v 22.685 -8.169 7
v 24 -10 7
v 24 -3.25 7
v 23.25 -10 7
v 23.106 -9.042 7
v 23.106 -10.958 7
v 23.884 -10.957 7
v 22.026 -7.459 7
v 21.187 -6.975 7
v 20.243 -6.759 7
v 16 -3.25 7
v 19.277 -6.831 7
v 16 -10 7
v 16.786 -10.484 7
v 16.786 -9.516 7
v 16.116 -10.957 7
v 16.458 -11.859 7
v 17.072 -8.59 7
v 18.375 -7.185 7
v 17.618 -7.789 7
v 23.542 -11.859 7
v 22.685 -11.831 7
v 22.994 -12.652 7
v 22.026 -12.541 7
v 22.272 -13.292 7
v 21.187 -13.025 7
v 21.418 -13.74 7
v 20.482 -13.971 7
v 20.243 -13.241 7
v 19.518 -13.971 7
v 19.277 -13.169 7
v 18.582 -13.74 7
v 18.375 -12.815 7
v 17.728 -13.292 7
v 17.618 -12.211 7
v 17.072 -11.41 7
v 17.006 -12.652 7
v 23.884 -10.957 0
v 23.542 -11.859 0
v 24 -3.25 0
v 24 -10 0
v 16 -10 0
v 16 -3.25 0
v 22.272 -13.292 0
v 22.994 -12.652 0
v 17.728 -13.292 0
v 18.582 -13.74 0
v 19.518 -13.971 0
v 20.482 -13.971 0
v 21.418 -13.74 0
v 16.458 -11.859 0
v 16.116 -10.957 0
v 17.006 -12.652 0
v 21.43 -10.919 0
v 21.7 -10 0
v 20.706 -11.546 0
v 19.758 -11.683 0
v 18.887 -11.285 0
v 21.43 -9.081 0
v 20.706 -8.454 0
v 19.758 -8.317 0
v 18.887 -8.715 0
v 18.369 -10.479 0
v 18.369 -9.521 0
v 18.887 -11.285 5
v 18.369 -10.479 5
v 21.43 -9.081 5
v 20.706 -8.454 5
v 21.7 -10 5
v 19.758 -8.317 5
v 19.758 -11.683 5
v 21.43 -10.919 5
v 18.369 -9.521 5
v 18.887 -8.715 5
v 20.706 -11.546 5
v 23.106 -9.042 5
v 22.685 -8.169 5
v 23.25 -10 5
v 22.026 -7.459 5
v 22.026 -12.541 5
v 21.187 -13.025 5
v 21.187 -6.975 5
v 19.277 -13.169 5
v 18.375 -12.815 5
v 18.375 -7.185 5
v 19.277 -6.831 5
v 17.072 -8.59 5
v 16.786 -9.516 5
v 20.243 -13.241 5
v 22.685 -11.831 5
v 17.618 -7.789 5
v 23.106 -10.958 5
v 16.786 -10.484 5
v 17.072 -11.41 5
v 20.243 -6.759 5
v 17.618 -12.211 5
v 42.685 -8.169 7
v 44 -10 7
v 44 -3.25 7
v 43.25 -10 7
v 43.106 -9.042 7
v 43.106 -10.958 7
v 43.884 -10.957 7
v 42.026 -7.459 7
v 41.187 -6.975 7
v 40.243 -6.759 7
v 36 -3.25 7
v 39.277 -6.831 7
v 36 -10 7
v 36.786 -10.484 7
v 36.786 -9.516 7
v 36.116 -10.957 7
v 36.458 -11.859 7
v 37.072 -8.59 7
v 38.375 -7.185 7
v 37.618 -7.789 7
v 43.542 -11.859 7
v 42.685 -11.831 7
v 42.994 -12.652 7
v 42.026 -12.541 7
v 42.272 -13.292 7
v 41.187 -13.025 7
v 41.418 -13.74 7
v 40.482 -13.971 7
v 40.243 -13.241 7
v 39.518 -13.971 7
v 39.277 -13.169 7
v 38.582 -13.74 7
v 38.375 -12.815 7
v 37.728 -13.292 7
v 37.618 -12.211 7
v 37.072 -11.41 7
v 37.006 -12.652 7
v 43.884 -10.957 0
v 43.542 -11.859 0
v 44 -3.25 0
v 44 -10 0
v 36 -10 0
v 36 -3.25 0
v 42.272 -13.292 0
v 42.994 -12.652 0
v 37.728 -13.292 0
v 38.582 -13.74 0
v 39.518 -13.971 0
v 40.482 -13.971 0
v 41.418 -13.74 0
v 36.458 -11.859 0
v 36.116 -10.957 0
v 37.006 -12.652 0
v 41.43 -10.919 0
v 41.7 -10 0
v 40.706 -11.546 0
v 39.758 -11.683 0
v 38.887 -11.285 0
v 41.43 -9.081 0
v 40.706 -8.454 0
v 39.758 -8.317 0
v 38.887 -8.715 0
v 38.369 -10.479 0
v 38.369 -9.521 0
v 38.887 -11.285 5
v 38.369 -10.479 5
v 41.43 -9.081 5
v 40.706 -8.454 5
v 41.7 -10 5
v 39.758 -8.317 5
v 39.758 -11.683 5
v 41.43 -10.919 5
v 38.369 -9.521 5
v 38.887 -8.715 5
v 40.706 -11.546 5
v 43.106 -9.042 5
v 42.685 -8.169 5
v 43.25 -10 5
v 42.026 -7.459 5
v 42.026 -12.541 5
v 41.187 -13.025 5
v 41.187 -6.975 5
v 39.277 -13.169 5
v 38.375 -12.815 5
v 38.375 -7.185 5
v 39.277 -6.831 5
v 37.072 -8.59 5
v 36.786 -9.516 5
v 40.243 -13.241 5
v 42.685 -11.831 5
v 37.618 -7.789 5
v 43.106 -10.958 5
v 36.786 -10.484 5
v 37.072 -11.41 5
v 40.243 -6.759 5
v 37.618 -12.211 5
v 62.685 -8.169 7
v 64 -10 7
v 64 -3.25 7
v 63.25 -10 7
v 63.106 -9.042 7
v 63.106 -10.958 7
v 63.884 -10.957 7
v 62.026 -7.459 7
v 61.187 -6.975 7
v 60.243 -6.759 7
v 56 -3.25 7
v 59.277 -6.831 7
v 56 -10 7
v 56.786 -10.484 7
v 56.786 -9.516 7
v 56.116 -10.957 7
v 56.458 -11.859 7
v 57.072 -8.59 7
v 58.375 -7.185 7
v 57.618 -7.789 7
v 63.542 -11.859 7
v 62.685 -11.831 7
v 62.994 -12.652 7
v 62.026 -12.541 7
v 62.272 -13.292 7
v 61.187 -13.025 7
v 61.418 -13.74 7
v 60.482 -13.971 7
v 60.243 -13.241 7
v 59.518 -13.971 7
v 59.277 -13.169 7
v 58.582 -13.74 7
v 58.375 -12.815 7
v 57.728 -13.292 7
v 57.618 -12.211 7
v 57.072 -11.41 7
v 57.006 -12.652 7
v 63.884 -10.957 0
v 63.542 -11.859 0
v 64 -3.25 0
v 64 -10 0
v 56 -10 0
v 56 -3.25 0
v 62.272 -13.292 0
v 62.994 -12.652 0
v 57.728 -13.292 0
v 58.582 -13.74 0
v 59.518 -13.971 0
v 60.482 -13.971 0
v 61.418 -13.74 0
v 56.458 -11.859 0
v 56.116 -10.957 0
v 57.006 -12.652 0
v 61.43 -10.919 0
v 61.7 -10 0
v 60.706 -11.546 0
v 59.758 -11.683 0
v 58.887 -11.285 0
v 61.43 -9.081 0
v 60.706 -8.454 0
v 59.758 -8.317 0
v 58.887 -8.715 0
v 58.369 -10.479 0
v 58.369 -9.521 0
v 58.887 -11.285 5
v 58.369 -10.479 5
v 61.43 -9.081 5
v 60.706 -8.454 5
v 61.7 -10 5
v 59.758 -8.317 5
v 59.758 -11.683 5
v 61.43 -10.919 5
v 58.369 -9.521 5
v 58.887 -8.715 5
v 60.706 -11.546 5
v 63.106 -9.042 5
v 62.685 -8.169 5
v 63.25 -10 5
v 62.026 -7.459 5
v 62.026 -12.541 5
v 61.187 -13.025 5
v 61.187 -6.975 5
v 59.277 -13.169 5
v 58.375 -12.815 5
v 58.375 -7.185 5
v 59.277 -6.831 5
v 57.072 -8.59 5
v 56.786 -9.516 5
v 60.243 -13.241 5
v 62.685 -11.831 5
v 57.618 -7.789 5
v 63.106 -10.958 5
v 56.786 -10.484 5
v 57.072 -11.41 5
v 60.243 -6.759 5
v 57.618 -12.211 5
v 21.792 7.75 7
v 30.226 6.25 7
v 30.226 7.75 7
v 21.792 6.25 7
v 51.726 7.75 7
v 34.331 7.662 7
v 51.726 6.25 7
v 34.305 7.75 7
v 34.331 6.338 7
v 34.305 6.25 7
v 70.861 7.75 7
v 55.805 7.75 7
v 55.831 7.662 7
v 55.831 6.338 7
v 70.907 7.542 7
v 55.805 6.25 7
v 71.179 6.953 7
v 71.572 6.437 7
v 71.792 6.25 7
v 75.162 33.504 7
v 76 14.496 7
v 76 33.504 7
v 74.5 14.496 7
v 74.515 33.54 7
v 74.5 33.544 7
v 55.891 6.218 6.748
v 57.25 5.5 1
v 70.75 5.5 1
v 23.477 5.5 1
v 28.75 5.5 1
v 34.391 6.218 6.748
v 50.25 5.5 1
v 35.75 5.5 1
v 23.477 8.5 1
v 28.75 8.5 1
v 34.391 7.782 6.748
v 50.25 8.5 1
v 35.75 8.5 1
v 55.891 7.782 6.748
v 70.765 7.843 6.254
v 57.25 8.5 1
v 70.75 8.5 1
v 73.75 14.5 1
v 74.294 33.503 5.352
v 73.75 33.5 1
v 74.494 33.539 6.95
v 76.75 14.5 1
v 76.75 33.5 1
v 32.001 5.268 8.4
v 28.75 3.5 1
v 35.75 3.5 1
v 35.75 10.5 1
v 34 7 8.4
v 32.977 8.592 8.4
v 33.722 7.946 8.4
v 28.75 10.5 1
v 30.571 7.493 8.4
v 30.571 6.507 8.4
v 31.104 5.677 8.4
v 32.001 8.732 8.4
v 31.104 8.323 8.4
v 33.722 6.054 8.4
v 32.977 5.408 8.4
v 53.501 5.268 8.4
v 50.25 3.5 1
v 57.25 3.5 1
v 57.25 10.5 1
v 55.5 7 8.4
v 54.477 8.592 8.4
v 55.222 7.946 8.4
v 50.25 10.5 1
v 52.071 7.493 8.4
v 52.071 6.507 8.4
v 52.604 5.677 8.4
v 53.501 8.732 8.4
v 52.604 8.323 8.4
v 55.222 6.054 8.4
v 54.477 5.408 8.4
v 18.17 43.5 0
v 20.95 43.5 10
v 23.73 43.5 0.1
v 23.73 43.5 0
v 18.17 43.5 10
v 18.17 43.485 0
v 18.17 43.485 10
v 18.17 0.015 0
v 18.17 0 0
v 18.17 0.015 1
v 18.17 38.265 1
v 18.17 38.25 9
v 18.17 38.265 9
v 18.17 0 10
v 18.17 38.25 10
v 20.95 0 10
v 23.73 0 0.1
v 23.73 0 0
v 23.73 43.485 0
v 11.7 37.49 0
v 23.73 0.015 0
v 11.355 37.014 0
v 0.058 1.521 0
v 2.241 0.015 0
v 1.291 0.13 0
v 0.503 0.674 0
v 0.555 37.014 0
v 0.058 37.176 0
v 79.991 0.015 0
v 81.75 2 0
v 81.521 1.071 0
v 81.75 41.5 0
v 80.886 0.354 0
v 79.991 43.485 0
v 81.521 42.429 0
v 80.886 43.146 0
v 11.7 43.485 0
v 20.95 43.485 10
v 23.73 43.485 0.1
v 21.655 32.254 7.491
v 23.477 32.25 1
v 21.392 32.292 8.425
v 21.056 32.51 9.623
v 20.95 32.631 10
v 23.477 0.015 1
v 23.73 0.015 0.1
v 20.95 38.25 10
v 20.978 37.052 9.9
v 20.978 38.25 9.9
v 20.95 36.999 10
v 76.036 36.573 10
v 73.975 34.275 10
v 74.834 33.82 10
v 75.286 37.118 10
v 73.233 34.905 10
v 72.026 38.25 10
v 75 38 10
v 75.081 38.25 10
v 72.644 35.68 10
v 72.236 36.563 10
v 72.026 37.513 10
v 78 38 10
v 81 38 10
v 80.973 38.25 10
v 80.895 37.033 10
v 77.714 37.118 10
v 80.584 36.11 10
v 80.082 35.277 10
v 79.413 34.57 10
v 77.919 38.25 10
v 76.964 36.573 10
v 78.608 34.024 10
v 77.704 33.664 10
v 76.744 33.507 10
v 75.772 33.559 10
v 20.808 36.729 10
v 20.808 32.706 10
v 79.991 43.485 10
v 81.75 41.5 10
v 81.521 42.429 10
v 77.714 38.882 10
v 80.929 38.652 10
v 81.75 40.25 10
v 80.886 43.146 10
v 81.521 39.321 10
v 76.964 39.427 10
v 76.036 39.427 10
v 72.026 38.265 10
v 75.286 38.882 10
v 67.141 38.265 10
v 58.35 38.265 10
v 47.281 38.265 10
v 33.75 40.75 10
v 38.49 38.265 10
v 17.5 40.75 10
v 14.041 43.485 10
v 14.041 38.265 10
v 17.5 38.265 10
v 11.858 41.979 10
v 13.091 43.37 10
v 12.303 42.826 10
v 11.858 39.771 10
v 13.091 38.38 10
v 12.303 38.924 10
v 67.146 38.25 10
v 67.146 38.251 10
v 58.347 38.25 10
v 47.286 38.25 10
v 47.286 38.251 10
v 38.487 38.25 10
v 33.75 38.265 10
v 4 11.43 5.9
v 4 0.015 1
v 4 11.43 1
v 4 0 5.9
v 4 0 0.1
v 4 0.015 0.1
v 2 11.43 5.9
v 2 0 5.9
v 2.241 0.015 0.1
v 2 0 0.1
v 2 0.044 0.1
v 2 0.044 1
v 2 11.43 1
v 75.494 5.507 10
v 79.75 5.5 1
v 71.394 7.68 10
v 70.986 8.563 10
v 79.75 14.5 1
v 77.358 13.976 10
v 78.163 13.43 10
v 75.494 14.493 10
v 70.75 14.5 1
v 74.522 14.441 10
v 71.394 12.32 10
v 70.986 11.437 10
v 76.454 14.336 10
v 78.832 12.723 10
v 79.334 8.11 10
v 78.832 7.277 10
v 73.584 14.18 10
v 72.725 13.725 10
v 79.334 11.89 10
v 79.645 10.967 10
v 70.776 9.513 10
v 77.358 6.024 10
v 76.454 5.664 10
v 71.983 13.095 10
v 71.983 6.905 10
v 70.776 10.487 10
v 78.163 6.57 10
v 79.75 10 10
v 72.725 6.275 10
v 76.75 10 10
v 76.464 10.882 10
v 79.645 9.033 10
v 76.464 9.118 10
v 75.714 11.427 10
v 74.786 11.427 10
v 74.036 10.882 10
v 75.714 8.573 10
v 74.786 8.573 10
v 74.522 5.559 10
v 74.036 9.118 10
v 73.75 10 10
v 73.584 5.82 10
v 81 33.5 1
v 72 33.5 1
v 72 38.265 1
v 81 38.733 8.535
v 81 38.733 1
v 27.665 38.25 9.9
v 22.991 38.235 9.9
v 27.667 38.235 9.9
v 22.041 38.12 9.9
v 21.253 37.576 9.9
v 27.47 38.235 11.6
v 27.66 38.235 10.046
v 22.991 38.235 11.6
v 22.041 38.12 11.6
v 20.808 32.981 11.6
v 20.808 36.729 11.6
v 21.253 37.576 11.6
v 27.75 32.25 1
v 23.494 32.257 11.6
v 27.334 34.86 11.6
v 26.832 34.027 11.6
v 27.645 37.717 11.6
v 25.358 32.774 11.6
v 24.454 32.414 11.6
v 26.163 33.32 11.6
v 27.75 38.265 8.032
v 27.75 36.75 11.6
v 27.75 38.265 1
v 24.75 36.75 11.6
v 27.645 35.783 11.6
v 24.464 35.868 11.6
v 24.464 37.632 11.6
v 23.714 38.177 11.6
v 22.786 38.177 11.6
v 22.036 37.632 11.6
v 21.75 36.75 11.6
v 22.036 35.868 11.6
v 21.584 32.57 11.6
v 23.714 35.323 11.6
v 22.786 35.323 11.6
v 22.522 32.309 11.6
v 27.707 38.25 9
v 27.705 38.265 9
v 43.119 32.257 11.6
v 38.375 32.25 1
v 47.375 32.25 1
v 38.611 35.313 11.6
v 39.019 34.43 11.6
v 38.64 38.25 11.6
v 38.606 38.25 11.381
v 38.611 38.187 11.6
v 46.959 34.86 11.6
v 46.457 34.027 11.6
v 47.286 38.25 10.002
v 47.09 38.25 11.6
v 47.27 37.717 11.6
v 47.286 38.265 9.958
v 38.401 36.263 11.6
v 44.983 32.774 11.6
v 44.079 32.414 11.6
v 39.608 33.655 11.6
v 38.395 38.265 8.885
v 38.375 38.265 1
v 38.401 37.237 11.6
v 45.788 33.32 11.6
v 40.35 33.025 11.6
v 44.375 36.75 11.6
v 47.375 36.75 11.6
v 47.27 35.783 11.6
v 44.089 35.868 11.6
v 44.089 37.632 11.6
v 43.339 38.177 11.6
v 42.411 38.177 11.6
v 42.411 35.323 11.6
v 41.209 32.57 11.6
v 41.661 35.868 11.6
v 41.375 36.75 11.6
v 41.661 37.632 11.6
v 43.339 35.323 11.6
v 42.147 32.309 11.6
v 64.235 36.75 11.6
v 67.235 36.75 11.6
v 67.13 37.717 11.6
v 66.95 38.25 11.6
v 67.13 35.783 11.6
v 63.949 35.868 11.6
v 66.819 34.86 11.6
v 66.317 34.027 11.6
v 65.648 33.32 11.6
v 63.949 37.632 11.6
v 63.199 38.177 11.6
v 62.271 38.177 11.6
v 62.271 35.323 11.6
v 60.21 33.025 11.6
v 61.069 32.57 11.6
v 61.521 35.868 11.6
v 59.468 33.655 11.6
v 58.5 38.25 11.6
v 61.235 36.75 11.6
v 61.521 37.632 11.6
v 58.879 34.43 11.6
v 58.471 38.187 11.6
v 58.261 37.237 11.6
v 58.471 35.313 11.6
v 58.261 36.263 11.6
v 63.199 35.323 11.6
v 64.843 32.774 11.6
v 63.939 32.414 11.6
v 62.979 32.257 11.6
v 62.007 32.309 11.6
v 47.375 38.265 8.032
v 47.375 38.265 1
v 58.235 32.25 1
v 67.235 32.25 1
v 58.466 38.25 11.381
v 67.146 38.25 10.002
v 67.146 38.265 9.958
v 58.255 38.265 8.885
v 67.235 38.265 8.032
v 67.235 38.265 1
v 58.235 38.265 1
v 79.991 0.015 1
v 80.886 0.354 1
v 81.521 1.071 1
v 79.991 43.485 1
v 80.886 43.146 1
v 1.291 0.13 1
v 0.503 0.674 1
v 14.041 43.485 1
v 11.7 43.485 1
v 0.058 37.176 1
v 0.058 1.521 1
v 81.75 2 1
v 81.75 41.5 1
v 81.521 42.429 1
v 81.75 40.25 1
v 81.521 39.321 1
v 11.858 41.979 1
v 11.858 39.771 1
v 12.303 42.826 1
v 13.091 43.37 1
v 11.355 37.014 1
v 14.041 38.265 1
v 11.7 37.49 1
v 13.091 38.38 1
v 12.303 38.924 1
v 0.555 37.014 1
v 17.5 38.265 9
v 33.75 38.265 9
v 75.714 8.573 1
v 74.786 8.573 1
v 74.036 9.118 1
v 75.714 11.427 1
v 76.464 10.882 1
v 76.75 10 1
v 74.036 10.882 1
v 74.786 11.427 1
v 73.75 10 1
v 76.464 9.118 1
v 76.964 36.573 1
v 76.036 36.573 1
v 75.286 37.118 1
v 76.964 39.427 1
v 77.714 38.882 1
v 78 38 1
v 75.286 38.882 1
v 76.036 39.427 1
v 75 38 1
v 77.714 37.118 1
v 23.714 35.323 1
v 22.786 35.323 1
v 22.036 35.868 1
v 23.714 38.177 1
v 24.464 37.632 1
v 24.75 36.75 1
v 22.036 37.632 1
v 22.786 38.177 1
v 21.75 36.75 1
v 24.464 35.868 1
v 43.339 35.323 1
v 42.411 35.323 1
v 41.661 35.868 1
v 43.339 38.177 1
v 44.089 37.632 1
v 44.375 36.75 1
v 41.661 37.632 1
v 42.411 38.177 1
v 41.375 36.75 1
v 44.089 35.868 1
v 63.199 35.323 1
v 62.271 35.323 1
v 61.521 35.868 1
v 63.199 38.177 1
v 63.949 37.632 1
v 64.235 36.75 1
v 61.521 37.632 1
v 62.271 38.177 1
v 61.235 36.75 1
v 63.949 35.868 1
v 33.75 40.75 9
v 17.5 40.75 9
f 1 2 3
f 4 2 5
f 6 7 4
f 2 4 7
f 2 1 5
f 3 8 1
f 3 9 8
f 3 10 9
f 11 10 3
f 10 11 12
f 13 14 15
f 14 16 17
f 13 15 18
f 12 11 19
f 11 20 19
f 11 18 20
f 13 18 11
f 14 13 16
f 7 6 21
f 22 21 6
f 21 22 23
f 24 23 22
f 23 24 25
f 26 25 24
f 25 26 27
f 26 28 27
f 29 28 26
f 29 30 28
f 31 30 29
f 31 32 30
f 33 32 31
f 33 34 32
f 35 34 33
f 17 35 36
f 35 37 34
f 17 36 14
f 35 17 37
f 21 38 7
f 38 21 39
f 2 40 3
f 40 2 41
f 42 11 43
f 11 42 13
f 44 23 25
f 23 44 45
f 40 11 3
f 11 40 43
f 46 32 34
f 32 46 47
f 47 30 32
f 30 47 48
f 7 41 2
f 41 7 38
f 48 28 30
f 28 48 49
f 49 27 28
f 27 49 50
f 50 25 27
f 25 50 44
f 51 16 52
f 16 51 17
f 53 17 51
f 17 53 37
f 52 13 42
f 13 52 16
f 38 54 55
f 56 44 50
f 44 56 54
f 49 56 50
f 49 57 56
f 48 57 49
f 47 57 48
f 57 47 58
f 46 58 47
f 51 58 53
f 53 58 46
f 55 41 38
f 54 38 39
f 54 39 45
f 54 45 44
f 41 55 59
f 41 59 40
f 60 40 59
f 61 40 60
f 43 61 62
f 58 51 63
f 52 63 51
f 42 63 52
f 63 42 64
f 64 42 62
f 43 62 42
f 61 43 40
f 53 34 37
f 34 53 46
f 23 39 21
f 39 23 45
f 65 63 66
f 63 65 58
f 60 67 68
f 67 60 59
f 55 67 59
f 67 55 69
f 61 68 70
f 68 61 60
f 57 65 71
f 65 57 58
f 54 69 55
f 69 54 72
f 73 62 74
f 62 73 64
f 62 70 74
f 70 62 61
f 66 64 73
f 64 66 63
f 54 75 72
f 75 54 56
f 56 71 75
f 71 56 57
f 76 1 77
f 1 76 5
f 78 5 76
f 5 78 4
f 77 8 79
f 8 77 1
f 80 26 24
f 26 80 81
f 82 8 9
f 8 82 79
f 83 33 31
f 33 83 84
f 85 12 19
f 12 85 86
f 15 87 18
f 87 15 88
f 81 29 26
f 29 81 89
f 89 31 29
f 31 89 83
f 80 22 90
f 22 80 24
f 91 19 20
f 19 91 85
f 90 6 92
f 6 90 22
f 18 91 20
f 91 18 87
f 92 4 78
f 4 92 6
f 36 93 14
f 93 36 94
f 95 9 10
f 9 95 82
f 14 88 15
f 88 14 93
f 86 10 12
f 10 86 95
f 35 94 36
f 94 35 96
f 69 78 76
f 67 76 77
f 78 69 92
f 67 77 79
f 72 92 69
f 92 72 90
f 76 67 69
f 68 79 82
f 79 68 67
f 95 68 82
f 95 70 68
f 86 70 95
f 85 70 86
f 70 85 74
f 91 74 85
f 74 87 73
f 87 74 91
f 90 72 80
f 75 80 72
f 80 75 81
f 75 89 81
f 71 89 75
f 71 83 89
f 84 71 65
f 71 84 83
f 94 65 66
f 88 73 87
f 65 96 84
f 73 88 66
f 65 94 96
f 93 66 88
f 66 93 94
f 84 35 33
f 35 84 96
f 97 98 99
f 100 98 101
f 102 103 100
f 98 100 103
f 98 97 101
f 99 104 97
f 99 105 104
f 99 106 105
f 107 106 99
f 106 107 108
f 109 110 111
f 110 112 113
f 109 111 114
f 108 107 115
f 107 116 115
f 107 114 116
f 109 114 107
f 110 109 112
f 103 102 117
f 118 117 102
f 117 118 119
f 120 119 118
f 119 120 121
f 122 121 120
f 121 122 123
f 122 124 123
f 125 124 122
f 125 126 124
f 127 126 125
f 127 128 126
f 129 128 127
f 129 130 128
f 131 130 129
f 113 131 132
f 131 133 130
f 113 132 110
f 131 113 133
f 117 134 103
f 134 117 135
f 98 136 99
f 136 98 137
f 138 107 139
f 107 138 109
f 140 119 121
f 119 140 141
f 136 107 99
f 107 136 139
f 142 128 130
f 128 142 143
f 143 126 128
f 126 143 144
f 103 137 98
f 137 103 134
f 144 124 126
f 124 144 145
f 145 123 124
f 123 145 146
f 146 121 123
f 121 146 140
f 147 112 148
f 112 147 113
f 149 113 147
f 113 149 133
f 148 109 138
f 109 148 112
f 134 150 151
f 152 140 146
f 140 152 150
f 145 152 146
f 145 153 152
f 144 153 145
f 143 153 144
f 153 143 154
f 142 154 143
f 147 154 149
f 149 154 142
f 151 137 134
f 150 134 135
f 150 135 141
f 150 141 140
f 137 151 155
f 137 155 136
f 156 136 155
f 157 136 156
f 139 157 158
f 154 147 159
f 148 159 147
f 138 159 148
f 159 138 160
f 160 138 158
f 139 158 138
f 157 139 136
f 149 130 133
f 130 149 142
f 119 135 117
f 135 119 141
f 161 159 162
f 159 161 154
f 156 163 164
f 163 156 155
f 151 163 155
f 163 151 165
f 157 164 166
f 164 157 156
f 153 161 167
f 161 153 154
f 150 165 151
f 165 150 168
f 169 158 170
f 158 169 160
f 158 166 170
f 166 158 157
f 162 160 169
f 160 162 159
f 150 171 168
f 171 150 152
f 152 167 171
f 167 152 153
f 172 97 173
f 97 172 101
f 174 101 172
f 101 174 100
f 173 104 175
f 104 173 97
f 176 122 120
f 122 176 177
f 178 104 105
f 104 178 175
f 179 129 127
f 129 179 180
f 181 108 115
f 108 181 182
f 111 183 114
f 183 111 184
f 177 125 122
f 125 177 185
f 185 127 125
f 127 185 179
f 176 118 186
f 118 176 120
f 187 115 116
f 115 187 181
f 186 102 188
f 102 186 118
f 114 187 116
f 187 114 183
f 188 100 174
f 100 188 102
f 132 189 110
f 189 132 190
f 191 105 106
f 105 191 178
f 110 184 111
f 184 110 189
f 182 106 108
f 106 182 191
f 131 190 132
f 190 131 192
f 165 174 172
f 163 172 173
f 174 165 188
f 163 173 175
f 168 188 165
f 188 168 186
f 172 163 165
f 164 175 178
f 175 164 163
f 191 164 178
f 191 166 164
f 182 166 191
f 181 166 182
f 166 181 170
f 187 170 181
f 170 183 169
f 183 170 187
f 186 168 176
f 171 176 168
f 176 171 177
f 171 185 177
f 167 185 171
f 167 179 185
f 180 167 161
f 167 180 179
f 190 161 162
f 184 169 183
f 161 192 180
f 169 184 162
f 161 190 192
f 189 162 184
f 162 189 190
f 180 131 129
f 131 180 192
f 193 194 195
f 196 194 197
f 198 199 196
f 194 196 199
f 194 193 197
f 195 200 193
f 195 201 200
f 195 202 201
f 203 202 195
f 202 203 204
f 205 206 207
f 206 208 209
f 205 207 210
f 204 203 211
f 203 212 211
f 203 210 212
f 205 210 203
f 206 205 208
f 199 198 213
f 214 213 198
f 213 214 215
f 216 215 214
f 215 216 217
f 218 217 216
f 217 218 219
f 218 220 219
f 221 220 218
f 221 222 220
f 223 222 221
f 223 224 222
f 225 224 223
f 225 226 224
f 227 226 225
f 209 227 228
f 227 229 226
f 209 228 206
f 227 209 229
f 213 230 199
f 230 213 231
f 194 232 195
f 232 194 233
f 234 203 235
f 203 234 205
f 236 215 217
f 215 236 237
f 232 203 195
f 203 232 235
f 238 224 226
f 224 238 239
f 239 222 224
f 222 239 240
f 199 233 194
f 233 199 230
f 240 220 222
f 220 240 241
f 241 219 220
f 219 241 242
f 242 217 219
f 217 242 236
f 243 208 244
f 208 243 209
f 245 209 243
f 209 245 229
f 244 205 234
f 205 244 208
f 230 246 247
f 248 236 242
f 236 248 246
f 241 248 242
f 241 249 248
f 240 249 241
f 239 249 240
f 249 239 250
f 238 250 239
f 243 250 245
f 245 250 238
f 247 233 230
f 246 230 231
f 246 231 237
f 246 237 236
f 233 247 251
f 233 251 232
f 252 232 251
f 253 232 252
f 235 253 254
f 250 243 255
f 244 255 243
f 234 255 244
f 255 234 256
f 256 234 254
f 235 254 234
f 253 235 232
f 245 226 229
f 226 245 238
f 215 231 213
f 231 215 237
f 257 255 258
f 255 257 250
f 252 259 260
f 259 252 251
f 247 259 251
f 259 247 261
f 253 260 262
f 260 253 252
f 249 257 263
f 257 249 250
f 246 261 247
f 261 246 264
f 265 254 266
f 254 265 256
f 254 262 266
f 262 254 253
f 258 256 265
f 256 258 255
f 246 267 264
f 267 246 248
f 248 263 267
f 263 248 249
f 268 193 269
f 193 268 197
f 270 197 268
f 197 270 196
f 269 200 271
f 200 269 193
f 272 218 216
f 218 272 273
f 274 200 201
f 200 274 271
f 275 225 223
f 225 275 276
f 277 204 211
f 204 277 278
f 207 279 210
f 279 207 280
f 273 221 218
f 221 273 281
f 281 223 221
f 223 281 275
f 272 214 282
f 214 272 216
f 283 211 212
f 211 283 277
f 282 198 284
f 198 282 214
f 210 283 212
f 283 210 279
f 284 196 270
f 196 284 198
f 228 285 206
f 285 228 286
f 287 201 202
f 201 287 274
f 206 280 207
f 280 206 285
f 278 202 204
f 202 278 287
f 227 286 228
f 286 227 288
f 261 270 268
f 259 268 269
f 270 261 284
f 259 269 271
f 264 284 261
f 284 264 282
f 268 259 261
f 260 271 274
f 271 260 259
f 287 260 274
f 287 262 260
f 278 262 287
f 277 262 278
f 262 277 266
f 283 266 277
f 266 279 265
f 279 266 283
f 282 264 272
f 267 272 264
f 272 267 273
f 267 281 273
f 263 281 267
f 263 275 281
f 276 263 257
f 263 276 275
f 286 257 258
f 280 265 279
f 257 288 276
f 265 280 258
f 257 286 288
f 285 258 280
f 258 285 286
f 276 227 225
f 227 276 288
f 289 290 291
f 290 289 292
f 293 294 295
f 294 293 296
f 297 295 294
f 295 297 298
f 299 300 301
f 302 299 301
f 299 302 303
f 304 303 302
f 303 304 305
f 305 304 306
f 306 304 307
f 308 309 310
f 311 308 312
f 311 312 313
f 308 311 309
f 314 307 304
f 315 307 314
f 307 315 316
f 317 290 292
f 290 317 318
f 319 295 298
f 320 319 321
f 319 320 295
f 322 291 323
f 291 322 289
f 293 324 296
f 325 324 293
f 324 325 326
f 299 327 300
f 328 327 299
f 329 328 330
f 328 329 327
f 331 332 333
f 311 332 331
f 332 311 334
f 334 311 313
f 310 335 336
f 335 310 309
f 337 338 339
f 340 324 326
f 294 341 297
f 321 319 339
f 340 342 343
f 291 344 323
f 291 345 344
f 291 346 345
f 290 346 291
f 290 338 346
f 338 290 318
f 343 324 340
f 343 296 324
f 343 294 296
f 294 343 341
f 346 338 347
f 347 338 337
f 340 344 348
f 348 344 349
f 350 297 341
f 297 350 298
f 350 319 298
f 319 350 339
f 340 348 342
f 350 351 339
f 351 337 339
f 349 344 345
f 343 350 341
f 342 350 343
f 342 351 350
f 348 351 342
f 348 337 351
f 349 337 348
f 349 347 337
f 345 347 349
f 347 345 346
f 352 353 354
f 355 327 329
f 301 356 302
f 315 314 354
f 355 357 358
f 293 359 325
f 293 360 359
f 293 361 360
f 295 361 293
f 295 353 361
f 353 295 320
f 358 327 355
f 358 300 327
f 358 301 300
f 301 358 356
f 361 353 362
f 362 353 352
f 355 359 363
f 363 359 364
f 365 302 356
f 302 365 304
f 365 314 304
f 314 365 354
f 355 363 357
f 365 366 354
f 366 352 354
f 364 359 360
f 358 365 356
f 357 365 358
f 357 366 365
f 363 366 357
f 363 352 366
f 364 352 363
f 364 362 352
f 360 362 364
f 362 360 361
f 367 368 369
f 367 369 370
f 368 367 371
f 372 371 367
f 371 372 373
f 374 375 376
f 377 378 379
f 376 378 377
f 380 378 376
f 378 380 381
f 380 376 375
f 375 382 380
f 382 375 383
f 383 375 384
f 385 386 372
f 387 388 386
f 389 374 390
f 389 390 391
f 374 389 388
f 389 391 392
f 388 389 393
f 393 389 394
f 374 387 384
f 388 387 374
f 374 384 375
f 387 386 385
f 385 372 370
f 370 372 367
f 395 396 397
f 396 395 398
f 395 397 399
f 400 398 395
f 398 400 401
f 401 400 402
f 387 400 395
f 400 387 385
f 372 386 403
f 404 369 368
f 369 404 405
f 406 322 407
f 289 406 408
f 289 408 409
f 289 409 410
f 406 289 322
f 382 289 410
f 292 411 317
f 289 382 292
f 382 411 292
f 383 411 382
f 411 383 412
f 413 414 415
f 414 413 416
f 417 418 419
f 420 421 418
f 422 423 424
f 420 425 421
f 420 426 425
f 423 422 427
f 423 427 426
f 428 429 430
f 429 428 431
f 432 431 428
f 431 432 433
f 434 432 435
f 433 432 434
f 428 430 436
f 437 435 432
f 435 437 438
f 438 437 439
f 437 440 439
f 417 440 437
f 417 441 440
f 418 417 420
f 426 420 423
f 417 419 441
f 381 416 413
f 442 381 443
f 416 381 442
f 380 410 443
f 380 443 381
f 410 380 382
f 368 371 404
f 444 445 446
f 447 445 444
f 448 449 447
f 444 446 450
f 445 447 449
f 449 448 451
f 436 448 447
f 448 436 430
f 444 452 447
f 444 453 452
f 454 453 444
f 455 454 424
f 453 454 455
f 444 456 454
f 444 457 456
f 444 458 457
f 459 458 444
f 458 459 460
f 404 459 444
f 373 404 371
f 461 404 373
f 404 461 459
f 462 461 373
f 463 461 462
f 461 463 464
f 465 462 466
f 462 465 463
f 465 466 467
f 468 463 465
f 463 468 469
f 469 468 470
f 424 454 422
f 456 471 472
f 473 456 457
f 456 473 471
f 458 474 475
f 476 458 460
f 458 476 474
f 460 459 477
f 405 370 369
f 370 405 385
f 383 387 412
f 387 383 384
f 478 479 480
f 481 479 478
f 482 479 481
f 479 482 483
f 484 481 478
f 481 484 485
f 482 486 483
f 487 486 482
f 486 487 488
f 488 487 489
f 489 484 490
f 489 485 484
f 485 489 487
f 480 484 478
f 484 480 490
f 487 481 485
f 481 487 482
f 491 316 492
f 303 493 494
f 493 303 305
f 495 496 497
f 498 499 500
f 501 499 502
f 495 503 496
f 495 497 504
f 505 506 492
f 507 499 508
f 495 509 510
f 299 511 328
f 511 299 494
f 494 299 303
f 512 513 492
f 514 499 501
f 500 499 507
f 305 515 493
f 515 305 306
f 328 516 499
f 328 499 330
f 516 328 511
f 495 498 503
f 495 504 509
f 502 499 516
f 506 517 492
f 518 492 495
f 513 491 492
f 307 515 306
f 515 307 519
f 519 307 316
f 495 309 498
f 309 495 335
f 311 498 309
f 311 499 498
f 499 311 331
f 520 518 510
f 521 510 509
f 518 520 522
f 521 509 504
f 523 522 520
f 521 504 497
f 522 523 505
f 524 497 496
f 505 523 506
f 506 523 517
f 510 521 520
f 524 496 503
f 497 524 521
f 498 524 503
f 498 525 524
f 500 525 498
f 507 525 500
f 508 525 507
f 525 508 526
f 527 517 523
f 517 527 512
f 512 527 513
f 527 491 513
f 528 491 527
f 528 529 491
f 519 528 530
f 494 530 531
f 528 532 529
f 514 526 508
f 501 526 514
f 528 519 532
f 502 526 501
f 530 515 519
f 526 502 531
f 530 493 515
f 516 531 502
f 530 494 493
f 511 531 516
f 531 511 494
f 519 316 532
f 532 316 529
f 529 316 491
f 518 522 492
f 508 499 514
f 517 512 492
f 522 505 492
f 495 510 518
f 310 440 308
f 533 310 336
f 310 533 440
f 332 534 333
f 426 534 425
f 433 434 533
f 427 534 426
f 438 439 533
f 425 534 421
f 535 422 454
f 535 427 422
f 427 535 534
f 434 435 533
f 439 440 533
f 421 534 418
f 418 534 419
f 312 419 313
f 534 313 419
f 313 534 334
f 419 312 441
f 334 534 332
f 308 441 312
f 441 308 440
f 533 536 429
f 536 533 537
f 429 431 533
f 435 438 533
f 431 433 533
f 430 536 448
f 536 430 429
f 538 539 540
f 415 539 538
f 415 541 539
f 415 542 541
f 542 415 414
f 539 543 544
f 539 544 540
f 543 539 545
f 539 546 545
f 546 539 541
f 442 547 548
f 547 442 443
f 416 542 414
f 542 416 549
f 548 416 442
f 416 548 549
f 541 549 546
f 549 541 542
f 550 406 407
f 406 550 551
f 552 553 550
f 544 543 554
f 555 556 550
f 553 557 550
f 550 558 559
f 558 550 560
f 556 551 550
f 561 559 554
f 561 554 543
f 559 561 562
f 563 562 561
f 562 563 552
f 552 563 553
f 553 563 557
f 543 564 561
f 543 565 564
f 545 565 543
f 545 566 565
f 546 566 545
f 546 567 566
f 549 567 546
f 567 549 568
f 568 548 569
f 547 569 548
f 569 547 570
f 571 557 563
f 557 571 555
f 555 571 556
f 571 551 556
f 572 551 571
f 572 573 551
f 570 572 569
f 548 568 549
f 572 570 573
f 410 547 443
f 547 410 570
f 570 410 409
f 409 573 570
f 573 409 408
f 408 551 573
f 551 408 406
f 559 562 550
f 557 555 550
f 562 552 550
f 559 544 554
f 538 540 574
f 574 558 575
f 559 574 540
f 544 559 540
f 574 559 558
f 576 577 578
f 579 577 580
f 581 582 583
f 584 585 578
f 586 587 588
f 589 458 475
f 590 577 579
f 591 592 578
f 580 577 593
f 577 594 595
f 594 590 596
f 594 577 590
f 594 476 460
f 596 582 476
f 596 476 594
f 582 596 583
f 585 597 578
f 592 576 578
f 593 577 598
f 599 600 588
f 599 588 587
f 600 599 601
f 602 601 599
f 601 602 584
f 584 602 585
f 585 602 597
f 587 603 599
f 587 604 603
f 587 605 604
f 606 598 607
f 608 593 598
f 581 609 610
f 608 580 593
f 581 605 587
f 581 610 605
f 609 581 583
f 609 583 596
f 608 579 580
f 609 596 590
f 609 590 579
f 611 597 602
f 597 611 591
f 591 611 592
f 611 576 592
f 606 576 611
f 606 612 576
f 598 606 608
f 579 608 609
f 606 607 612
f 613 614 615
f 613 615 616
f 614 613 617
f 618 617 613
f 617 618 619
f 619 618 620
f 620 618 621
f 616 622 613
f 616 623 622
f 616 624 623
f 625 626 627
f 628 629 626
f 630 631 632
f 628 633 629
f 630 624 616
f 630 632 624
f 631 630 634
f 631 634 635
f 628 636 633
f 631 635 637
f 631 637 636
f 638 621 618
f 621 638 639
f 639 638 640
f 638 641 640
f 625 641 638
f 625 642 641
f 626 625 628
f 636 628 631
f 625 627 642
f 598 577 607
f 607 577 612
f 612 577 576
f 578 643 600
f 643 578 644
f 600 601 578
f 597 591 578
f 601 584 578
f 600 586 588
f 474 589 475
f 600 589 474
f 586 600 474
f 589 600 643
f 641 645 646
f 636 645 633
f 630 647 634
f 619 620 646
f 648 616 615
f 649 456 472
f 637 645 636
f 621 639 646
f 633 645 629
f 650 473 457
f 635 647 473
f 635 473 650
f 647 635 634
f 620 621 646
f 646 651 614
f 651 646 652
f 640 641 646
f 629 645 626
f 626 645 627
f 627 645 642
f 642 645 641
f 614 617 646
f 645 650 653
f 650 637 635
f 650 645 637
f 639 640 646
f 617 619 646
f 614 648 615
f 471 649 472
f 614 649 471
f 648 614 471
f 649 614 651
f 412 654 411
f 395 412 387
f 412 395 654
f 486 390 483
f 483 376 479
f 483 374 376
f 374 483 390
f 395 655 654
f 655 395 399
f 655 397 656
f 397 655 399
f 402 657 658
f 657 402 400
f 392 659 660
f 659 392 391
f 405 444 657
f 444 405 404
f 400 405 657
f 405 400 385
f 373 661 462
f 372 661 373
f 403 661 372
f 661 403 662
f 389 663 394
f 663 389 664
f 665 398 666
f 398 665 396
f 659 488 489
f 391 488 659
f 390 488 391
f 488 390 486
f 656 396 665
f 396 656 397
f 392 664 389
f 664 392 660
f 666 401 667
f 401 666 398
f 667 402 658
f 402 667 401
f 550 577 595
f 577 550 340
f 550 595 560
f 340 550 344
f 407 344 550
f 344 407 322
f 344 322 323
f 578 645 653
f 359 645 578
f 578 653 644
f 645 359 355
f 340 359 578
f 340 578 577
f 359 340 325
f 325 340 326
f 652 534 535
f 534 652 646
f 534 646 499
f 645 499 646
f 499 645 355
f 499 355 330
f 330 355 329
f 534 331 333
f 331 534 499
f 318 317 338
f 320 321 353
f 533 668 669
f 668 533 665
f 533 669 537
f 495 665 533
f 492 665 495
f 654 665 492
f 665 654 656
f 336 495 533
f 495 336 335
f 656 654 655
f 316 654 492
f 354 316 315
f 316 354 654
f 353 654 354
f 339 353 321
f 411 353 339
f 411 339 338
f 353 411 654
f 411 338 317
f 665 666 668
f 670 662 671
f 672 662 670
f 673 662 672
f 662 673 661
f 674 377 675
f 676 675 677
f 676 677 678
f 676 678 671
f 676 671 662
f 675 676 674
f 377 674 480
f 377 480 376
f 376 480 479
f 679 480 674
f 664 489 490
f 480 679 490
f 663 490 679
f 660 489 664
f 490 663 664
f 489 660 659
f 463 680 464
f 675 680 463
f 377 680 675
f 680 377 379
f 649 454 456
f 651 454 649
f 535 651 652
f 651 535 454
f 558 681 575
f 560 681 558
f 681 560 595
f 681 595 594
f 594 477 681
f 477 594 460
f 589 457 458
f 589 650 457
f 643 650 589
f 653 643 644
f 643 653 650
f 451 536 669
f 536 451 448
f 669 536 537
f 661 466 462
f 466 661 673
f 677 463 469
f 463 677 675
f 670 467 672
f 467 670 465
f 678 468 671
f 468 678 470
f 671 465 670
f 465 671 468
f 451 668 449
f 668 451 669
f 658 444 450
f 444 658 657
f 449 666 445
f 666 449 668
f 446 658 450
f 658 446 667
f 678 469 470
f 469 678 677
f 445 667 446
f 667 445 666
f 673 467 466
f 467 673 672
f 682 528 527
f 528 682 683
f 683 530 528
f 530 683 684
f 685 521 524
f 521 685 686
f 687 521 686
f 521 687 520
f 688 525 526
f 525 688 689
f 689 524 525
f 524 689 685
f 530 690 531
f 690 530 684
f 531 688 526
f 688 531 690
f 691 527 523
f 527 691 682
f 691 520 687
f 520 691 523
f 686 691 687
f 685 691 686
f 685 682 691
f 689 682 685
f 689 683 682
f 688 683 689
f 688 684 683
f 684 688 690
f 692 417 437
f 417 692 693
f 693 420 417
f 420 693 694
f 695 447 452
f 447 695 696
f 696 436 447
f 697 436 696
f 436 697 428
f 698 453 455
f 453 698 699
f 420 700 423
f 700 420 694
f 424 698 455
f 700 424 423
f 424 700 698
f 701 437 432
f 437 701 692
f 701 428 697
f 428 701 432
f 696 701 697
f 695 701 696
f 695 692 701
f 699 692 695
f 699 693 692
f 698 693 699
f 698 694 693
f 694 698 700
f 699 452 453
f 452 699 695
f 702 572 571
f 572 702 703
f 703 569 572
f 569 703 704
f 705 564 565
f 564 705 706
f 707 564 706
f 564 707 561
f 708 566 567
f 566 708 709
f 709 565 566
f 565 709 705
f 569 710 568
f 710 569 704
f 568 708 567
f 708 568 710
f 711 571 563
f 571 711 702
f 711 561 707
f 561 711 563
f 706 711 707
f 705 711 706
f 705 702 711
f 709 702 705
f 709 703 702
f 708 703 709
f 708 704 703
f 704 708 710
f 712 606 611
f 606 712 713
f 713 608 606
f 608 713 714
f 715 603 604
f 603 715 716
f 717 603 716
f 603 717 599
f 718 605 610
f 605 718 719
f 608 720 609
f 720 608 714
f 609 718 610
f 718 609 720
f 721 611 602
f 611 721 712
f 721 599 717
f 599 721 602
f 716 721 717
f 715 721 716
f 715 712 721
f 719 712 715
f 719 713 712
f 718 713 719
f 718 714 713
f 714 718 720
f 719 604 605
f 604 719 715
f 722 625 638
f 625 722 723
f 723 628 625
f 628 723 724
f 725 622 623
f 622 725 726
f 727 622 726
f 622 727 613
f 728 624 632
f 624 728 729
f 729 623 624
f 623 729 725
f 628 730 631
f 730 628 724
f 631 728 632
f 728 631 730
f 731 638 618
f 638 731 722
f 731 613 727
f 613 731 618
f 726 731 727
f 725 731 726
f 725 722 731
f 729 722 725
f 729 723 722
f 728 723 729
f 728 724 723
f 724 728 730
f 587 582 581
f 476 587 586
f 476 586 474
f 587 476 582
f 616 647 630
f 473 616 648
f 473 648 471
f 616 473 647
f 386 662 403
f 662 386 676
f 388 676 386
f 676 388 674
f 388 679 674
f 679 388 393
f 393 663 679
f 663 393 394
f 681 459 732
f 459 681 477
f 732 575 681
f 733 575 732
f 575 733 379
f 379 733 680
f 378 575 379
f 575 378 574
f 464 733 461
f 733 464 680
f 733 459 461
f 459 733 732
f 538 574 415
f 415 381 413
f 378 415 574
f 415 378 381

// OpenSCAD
inch = 25.4;
hq = true;
clr = 0.2;

$fs = hq ? 1 : 4;
$fa = hq ? 1 : 4;
eps = 0.1;

// Constants from the Eagle file

// Board dimensions
board_x = 0;
board_y = 0;
board_w = 81.75;
board_h = 43.5;
board_r = 2;

// Teensy location
teensy_cx =  9.08;
teensy_cy = 19.05;
teensy_w =  7 * 2.54;
teensy_h = 14 * 2.54;
teensy_paddle_w = 20.75;

// Tactile switches
sw1_x = 32.25;
sw1_y = 7;
sw2_x = 53.75;
sw2_y = 7;
sw_d = 2.5;

// Screw holes
hole1_x = 75.25;
hole1_y = 10;
hole2_x = 76.5;
hole2_y = 38;
hole_d = 3;
hole_clr = 0;

// Paddles
paddle_y = 3.5;

// Spine
spine_y = 38.25;
spine_cx2 = (37.25 + 48.5) / 2;
spine_cx3 = (58.75 + 66.72) / 2;

// Header
header_cx = 7.79;
header_cy = 39.73;
header_w = 3 * 2.54;
header_h = 2 * 2.54;

// End Eagle constants

spine_screw_y = spine_y - hole_d / 2;
teensy_rx = teensy_cx + teensy_w / 2;
spine_cx1 = teensy_paddle_w + hole_d / 2 + 1;

// Z heights
base_z = 1;
deck_z = base_z + 9;
top_z = deck_z + 1.6;
sw_z = deck_z - 1.6;
teensy_z = deck_z - 4.1;
pin_z = deck_z - 9;
bulkhead_z = deck_z - 3;

// The booboo
booboo_x0 = 19.5 - 2;
booboo_x1 = 31.75 + 2;
booboo_y = 39.5;
booboo_h = 2 * (booboo_y - spine_y);
booboo_t = 1.0;

module centered_cube(size, zt=0) {
    translate([-size[0] / 2, -size[1] / 2, zt])
        cube(size);
}

module round_rect(size, r) {
    hull()
        for (x = [r, size[0] - r]) for ( y = [r, size[1] - r]) {
            translate([x, y, 0])
                cylinder(r=r, h=size[2]);
        }
}


module base() {
    round_rect([board_w, board_h, base_z], board_r);
}

module spine() {
    lx = header_cx + header_w / 2 + clr;
    translate([lx, spine_y, eps])
        round_rect([board_w - lx, board_h - spine_y, top_z - eps], r=board_r);
}

module bulkheads() {
    bt0 = 3;
    bt1 = 1.5;
    bx = teensy_rx + clr;
    by = sw1_y;
    bw = hole1_x - bx;
    bh = board_h - by;
    translate([bx + eps, by, 0])
        hull() {
            translate([0, -bt0/2, base_z - eps])
                cube([bw + bt0/2, bt0, eps]);
            translate([0, -bt1/2, bulkhead_z - eps])
                cube([bw + bt1/2, bt1, eps]);
        }
    translate([bx + bw, board_h, 0])
        rotate(-90)
            hull() {
                translate([eps, -bt0/2, base_z - eps])
                    cube([bh + bt0/2 - eps, bt0, eps]);
                translate([eps, -bt1/2, bulkhead_z - eps])
                    cube([bh + bt1/2 - eps, bt1, eps]);
            }
}

module spine_cutout() {
    translate([10 - eps, spine_y, deck_z])
         cube([board_w, board_h, top_z]);
     // translate([0, 0, deck_z])
     //     cube([teensy_paddle_w, board_h, top_z]);
}

module screw_support(x, y, z) {
    support_d = hole_d + 2 * 3;
    hull() {
        translate([x, y, base_z - eps])
            centered_cube([support_d, support_d, eps]);
        translate([x, y, z - eps])
            cylinder(d=support_d, h = eps);
    }
}

module assign_screw_supports() {
    screw_support(hole1_x, hole1_y, deck_z);
    screw_support(hole2_x, hole2_y, deck_z);
}

module spine_screw_supports() {
    y = spine_screw_y;
    intersection() {
        screw_support(spine_cx1, spine_screw_y, top_z);
        union() {
            cube([board_w, board_h, deck_z - eps]);
            translate([teensy_paddle_w, 0, eps])
                round_rect([board_w, spine_y, top_z + eps], r=2);
        }
    }
    screw_support(spine_cx2, spine_screw_y, top_z);
    screw_support(spine_cx3, spine_screw_y, top_z);
}

module screw_hole(x, y, z) {
    translate([x, y, z])
        cylinder(d=hole_d + hole_clr, h=deck_z + 3);
}

module assign_screw_holes() {
    screw_hole(hole1_x, hole1_y, base_z);
    screw_hole(hole2_x, hole2_y, base_z);
}

module spine_screw_holes() {
    for (x = [spine_cx1, spine_cx2, spine_cx3])
        screw_hole(x, spine_screw_y, base_z);
}

module switch_pillars() {
    module switch_pillar(x, y) {
        mbh = 2 * (y - paddle_y);
        mbw = mbh;
        translate([x, y, 0])
            hull() {
                centered_cube([mbw, mbh, eps], zt=base_z - eps);
                translate([0, 0, sw_z - eps])
                    cylinder(d=sw_d + 1, h=eps);
            }
    }
    switch_pillar(sw1_x, sw1_y);
    switch_pillar(sw2_x, sw2_y);
}

module under_teensy() {
    uw = teensy_paddle_w - teensy_rx;
    translate([teensy_rx + clr, 0, 0])
        hull() {
            cube([2 * uw, board_h, eps]);
            translate([0, 0, deck_z - eps])
                cube([uw, board_h, eps]);
        }
    translate([2, 0, eps])
        cube([2, 4.5 * 2.54, teensy_z - eps]);
}

module header_cutout() {
    translate([-eps, header_cy - header_h / 2 - clr, -eps])
        round_rect([header_cx + header_w / 2 + clr, board_h, deck_z + 2 * eps],
                   r=0.5);
}

module booboo_cutout() {
    translate([booboo_x0, booboo_y - booboo_h / 2, deck_z - booboo_t])
        cube([booboo_x1 - booboo_x0, booboo_h, booboo_t + eps]);
}

module substrate() {
    difference() {
        union() {
            base();
            spine();
            bulkheads();
            switch_pillars();
            under_teensy();
            assign_screw_supports();
            spine_screw_supports();
        };
        assign_screw_holes();
        spine_screw_holes();
        spine_cutout();
        header_cutout();
        booboo_cutout();
    };
}

module clip() {
    clip_t = 7;
    y = board_h - spine_screw_y;
    difference() {
        hull() {
            cylinder(d=hole_d + 5, h=clip_t);
            translate([-hole_d / 2 - 2.5, y - eps, 0])
                cube([hole_d + 5, eps, clip_t]);
        }
        cylinder(d=hole_d + hole_clr + 2 * clr, h=3 * clip_t, center=true);
        translate([0, 0, clip_t - 2])
            cylinder(d=6.5, h=3);
    }
}


module clips() {
    for (x = [20, 40, 60])
        translate([x, -10, 0])
            clip();
}

clips();
substrate();
